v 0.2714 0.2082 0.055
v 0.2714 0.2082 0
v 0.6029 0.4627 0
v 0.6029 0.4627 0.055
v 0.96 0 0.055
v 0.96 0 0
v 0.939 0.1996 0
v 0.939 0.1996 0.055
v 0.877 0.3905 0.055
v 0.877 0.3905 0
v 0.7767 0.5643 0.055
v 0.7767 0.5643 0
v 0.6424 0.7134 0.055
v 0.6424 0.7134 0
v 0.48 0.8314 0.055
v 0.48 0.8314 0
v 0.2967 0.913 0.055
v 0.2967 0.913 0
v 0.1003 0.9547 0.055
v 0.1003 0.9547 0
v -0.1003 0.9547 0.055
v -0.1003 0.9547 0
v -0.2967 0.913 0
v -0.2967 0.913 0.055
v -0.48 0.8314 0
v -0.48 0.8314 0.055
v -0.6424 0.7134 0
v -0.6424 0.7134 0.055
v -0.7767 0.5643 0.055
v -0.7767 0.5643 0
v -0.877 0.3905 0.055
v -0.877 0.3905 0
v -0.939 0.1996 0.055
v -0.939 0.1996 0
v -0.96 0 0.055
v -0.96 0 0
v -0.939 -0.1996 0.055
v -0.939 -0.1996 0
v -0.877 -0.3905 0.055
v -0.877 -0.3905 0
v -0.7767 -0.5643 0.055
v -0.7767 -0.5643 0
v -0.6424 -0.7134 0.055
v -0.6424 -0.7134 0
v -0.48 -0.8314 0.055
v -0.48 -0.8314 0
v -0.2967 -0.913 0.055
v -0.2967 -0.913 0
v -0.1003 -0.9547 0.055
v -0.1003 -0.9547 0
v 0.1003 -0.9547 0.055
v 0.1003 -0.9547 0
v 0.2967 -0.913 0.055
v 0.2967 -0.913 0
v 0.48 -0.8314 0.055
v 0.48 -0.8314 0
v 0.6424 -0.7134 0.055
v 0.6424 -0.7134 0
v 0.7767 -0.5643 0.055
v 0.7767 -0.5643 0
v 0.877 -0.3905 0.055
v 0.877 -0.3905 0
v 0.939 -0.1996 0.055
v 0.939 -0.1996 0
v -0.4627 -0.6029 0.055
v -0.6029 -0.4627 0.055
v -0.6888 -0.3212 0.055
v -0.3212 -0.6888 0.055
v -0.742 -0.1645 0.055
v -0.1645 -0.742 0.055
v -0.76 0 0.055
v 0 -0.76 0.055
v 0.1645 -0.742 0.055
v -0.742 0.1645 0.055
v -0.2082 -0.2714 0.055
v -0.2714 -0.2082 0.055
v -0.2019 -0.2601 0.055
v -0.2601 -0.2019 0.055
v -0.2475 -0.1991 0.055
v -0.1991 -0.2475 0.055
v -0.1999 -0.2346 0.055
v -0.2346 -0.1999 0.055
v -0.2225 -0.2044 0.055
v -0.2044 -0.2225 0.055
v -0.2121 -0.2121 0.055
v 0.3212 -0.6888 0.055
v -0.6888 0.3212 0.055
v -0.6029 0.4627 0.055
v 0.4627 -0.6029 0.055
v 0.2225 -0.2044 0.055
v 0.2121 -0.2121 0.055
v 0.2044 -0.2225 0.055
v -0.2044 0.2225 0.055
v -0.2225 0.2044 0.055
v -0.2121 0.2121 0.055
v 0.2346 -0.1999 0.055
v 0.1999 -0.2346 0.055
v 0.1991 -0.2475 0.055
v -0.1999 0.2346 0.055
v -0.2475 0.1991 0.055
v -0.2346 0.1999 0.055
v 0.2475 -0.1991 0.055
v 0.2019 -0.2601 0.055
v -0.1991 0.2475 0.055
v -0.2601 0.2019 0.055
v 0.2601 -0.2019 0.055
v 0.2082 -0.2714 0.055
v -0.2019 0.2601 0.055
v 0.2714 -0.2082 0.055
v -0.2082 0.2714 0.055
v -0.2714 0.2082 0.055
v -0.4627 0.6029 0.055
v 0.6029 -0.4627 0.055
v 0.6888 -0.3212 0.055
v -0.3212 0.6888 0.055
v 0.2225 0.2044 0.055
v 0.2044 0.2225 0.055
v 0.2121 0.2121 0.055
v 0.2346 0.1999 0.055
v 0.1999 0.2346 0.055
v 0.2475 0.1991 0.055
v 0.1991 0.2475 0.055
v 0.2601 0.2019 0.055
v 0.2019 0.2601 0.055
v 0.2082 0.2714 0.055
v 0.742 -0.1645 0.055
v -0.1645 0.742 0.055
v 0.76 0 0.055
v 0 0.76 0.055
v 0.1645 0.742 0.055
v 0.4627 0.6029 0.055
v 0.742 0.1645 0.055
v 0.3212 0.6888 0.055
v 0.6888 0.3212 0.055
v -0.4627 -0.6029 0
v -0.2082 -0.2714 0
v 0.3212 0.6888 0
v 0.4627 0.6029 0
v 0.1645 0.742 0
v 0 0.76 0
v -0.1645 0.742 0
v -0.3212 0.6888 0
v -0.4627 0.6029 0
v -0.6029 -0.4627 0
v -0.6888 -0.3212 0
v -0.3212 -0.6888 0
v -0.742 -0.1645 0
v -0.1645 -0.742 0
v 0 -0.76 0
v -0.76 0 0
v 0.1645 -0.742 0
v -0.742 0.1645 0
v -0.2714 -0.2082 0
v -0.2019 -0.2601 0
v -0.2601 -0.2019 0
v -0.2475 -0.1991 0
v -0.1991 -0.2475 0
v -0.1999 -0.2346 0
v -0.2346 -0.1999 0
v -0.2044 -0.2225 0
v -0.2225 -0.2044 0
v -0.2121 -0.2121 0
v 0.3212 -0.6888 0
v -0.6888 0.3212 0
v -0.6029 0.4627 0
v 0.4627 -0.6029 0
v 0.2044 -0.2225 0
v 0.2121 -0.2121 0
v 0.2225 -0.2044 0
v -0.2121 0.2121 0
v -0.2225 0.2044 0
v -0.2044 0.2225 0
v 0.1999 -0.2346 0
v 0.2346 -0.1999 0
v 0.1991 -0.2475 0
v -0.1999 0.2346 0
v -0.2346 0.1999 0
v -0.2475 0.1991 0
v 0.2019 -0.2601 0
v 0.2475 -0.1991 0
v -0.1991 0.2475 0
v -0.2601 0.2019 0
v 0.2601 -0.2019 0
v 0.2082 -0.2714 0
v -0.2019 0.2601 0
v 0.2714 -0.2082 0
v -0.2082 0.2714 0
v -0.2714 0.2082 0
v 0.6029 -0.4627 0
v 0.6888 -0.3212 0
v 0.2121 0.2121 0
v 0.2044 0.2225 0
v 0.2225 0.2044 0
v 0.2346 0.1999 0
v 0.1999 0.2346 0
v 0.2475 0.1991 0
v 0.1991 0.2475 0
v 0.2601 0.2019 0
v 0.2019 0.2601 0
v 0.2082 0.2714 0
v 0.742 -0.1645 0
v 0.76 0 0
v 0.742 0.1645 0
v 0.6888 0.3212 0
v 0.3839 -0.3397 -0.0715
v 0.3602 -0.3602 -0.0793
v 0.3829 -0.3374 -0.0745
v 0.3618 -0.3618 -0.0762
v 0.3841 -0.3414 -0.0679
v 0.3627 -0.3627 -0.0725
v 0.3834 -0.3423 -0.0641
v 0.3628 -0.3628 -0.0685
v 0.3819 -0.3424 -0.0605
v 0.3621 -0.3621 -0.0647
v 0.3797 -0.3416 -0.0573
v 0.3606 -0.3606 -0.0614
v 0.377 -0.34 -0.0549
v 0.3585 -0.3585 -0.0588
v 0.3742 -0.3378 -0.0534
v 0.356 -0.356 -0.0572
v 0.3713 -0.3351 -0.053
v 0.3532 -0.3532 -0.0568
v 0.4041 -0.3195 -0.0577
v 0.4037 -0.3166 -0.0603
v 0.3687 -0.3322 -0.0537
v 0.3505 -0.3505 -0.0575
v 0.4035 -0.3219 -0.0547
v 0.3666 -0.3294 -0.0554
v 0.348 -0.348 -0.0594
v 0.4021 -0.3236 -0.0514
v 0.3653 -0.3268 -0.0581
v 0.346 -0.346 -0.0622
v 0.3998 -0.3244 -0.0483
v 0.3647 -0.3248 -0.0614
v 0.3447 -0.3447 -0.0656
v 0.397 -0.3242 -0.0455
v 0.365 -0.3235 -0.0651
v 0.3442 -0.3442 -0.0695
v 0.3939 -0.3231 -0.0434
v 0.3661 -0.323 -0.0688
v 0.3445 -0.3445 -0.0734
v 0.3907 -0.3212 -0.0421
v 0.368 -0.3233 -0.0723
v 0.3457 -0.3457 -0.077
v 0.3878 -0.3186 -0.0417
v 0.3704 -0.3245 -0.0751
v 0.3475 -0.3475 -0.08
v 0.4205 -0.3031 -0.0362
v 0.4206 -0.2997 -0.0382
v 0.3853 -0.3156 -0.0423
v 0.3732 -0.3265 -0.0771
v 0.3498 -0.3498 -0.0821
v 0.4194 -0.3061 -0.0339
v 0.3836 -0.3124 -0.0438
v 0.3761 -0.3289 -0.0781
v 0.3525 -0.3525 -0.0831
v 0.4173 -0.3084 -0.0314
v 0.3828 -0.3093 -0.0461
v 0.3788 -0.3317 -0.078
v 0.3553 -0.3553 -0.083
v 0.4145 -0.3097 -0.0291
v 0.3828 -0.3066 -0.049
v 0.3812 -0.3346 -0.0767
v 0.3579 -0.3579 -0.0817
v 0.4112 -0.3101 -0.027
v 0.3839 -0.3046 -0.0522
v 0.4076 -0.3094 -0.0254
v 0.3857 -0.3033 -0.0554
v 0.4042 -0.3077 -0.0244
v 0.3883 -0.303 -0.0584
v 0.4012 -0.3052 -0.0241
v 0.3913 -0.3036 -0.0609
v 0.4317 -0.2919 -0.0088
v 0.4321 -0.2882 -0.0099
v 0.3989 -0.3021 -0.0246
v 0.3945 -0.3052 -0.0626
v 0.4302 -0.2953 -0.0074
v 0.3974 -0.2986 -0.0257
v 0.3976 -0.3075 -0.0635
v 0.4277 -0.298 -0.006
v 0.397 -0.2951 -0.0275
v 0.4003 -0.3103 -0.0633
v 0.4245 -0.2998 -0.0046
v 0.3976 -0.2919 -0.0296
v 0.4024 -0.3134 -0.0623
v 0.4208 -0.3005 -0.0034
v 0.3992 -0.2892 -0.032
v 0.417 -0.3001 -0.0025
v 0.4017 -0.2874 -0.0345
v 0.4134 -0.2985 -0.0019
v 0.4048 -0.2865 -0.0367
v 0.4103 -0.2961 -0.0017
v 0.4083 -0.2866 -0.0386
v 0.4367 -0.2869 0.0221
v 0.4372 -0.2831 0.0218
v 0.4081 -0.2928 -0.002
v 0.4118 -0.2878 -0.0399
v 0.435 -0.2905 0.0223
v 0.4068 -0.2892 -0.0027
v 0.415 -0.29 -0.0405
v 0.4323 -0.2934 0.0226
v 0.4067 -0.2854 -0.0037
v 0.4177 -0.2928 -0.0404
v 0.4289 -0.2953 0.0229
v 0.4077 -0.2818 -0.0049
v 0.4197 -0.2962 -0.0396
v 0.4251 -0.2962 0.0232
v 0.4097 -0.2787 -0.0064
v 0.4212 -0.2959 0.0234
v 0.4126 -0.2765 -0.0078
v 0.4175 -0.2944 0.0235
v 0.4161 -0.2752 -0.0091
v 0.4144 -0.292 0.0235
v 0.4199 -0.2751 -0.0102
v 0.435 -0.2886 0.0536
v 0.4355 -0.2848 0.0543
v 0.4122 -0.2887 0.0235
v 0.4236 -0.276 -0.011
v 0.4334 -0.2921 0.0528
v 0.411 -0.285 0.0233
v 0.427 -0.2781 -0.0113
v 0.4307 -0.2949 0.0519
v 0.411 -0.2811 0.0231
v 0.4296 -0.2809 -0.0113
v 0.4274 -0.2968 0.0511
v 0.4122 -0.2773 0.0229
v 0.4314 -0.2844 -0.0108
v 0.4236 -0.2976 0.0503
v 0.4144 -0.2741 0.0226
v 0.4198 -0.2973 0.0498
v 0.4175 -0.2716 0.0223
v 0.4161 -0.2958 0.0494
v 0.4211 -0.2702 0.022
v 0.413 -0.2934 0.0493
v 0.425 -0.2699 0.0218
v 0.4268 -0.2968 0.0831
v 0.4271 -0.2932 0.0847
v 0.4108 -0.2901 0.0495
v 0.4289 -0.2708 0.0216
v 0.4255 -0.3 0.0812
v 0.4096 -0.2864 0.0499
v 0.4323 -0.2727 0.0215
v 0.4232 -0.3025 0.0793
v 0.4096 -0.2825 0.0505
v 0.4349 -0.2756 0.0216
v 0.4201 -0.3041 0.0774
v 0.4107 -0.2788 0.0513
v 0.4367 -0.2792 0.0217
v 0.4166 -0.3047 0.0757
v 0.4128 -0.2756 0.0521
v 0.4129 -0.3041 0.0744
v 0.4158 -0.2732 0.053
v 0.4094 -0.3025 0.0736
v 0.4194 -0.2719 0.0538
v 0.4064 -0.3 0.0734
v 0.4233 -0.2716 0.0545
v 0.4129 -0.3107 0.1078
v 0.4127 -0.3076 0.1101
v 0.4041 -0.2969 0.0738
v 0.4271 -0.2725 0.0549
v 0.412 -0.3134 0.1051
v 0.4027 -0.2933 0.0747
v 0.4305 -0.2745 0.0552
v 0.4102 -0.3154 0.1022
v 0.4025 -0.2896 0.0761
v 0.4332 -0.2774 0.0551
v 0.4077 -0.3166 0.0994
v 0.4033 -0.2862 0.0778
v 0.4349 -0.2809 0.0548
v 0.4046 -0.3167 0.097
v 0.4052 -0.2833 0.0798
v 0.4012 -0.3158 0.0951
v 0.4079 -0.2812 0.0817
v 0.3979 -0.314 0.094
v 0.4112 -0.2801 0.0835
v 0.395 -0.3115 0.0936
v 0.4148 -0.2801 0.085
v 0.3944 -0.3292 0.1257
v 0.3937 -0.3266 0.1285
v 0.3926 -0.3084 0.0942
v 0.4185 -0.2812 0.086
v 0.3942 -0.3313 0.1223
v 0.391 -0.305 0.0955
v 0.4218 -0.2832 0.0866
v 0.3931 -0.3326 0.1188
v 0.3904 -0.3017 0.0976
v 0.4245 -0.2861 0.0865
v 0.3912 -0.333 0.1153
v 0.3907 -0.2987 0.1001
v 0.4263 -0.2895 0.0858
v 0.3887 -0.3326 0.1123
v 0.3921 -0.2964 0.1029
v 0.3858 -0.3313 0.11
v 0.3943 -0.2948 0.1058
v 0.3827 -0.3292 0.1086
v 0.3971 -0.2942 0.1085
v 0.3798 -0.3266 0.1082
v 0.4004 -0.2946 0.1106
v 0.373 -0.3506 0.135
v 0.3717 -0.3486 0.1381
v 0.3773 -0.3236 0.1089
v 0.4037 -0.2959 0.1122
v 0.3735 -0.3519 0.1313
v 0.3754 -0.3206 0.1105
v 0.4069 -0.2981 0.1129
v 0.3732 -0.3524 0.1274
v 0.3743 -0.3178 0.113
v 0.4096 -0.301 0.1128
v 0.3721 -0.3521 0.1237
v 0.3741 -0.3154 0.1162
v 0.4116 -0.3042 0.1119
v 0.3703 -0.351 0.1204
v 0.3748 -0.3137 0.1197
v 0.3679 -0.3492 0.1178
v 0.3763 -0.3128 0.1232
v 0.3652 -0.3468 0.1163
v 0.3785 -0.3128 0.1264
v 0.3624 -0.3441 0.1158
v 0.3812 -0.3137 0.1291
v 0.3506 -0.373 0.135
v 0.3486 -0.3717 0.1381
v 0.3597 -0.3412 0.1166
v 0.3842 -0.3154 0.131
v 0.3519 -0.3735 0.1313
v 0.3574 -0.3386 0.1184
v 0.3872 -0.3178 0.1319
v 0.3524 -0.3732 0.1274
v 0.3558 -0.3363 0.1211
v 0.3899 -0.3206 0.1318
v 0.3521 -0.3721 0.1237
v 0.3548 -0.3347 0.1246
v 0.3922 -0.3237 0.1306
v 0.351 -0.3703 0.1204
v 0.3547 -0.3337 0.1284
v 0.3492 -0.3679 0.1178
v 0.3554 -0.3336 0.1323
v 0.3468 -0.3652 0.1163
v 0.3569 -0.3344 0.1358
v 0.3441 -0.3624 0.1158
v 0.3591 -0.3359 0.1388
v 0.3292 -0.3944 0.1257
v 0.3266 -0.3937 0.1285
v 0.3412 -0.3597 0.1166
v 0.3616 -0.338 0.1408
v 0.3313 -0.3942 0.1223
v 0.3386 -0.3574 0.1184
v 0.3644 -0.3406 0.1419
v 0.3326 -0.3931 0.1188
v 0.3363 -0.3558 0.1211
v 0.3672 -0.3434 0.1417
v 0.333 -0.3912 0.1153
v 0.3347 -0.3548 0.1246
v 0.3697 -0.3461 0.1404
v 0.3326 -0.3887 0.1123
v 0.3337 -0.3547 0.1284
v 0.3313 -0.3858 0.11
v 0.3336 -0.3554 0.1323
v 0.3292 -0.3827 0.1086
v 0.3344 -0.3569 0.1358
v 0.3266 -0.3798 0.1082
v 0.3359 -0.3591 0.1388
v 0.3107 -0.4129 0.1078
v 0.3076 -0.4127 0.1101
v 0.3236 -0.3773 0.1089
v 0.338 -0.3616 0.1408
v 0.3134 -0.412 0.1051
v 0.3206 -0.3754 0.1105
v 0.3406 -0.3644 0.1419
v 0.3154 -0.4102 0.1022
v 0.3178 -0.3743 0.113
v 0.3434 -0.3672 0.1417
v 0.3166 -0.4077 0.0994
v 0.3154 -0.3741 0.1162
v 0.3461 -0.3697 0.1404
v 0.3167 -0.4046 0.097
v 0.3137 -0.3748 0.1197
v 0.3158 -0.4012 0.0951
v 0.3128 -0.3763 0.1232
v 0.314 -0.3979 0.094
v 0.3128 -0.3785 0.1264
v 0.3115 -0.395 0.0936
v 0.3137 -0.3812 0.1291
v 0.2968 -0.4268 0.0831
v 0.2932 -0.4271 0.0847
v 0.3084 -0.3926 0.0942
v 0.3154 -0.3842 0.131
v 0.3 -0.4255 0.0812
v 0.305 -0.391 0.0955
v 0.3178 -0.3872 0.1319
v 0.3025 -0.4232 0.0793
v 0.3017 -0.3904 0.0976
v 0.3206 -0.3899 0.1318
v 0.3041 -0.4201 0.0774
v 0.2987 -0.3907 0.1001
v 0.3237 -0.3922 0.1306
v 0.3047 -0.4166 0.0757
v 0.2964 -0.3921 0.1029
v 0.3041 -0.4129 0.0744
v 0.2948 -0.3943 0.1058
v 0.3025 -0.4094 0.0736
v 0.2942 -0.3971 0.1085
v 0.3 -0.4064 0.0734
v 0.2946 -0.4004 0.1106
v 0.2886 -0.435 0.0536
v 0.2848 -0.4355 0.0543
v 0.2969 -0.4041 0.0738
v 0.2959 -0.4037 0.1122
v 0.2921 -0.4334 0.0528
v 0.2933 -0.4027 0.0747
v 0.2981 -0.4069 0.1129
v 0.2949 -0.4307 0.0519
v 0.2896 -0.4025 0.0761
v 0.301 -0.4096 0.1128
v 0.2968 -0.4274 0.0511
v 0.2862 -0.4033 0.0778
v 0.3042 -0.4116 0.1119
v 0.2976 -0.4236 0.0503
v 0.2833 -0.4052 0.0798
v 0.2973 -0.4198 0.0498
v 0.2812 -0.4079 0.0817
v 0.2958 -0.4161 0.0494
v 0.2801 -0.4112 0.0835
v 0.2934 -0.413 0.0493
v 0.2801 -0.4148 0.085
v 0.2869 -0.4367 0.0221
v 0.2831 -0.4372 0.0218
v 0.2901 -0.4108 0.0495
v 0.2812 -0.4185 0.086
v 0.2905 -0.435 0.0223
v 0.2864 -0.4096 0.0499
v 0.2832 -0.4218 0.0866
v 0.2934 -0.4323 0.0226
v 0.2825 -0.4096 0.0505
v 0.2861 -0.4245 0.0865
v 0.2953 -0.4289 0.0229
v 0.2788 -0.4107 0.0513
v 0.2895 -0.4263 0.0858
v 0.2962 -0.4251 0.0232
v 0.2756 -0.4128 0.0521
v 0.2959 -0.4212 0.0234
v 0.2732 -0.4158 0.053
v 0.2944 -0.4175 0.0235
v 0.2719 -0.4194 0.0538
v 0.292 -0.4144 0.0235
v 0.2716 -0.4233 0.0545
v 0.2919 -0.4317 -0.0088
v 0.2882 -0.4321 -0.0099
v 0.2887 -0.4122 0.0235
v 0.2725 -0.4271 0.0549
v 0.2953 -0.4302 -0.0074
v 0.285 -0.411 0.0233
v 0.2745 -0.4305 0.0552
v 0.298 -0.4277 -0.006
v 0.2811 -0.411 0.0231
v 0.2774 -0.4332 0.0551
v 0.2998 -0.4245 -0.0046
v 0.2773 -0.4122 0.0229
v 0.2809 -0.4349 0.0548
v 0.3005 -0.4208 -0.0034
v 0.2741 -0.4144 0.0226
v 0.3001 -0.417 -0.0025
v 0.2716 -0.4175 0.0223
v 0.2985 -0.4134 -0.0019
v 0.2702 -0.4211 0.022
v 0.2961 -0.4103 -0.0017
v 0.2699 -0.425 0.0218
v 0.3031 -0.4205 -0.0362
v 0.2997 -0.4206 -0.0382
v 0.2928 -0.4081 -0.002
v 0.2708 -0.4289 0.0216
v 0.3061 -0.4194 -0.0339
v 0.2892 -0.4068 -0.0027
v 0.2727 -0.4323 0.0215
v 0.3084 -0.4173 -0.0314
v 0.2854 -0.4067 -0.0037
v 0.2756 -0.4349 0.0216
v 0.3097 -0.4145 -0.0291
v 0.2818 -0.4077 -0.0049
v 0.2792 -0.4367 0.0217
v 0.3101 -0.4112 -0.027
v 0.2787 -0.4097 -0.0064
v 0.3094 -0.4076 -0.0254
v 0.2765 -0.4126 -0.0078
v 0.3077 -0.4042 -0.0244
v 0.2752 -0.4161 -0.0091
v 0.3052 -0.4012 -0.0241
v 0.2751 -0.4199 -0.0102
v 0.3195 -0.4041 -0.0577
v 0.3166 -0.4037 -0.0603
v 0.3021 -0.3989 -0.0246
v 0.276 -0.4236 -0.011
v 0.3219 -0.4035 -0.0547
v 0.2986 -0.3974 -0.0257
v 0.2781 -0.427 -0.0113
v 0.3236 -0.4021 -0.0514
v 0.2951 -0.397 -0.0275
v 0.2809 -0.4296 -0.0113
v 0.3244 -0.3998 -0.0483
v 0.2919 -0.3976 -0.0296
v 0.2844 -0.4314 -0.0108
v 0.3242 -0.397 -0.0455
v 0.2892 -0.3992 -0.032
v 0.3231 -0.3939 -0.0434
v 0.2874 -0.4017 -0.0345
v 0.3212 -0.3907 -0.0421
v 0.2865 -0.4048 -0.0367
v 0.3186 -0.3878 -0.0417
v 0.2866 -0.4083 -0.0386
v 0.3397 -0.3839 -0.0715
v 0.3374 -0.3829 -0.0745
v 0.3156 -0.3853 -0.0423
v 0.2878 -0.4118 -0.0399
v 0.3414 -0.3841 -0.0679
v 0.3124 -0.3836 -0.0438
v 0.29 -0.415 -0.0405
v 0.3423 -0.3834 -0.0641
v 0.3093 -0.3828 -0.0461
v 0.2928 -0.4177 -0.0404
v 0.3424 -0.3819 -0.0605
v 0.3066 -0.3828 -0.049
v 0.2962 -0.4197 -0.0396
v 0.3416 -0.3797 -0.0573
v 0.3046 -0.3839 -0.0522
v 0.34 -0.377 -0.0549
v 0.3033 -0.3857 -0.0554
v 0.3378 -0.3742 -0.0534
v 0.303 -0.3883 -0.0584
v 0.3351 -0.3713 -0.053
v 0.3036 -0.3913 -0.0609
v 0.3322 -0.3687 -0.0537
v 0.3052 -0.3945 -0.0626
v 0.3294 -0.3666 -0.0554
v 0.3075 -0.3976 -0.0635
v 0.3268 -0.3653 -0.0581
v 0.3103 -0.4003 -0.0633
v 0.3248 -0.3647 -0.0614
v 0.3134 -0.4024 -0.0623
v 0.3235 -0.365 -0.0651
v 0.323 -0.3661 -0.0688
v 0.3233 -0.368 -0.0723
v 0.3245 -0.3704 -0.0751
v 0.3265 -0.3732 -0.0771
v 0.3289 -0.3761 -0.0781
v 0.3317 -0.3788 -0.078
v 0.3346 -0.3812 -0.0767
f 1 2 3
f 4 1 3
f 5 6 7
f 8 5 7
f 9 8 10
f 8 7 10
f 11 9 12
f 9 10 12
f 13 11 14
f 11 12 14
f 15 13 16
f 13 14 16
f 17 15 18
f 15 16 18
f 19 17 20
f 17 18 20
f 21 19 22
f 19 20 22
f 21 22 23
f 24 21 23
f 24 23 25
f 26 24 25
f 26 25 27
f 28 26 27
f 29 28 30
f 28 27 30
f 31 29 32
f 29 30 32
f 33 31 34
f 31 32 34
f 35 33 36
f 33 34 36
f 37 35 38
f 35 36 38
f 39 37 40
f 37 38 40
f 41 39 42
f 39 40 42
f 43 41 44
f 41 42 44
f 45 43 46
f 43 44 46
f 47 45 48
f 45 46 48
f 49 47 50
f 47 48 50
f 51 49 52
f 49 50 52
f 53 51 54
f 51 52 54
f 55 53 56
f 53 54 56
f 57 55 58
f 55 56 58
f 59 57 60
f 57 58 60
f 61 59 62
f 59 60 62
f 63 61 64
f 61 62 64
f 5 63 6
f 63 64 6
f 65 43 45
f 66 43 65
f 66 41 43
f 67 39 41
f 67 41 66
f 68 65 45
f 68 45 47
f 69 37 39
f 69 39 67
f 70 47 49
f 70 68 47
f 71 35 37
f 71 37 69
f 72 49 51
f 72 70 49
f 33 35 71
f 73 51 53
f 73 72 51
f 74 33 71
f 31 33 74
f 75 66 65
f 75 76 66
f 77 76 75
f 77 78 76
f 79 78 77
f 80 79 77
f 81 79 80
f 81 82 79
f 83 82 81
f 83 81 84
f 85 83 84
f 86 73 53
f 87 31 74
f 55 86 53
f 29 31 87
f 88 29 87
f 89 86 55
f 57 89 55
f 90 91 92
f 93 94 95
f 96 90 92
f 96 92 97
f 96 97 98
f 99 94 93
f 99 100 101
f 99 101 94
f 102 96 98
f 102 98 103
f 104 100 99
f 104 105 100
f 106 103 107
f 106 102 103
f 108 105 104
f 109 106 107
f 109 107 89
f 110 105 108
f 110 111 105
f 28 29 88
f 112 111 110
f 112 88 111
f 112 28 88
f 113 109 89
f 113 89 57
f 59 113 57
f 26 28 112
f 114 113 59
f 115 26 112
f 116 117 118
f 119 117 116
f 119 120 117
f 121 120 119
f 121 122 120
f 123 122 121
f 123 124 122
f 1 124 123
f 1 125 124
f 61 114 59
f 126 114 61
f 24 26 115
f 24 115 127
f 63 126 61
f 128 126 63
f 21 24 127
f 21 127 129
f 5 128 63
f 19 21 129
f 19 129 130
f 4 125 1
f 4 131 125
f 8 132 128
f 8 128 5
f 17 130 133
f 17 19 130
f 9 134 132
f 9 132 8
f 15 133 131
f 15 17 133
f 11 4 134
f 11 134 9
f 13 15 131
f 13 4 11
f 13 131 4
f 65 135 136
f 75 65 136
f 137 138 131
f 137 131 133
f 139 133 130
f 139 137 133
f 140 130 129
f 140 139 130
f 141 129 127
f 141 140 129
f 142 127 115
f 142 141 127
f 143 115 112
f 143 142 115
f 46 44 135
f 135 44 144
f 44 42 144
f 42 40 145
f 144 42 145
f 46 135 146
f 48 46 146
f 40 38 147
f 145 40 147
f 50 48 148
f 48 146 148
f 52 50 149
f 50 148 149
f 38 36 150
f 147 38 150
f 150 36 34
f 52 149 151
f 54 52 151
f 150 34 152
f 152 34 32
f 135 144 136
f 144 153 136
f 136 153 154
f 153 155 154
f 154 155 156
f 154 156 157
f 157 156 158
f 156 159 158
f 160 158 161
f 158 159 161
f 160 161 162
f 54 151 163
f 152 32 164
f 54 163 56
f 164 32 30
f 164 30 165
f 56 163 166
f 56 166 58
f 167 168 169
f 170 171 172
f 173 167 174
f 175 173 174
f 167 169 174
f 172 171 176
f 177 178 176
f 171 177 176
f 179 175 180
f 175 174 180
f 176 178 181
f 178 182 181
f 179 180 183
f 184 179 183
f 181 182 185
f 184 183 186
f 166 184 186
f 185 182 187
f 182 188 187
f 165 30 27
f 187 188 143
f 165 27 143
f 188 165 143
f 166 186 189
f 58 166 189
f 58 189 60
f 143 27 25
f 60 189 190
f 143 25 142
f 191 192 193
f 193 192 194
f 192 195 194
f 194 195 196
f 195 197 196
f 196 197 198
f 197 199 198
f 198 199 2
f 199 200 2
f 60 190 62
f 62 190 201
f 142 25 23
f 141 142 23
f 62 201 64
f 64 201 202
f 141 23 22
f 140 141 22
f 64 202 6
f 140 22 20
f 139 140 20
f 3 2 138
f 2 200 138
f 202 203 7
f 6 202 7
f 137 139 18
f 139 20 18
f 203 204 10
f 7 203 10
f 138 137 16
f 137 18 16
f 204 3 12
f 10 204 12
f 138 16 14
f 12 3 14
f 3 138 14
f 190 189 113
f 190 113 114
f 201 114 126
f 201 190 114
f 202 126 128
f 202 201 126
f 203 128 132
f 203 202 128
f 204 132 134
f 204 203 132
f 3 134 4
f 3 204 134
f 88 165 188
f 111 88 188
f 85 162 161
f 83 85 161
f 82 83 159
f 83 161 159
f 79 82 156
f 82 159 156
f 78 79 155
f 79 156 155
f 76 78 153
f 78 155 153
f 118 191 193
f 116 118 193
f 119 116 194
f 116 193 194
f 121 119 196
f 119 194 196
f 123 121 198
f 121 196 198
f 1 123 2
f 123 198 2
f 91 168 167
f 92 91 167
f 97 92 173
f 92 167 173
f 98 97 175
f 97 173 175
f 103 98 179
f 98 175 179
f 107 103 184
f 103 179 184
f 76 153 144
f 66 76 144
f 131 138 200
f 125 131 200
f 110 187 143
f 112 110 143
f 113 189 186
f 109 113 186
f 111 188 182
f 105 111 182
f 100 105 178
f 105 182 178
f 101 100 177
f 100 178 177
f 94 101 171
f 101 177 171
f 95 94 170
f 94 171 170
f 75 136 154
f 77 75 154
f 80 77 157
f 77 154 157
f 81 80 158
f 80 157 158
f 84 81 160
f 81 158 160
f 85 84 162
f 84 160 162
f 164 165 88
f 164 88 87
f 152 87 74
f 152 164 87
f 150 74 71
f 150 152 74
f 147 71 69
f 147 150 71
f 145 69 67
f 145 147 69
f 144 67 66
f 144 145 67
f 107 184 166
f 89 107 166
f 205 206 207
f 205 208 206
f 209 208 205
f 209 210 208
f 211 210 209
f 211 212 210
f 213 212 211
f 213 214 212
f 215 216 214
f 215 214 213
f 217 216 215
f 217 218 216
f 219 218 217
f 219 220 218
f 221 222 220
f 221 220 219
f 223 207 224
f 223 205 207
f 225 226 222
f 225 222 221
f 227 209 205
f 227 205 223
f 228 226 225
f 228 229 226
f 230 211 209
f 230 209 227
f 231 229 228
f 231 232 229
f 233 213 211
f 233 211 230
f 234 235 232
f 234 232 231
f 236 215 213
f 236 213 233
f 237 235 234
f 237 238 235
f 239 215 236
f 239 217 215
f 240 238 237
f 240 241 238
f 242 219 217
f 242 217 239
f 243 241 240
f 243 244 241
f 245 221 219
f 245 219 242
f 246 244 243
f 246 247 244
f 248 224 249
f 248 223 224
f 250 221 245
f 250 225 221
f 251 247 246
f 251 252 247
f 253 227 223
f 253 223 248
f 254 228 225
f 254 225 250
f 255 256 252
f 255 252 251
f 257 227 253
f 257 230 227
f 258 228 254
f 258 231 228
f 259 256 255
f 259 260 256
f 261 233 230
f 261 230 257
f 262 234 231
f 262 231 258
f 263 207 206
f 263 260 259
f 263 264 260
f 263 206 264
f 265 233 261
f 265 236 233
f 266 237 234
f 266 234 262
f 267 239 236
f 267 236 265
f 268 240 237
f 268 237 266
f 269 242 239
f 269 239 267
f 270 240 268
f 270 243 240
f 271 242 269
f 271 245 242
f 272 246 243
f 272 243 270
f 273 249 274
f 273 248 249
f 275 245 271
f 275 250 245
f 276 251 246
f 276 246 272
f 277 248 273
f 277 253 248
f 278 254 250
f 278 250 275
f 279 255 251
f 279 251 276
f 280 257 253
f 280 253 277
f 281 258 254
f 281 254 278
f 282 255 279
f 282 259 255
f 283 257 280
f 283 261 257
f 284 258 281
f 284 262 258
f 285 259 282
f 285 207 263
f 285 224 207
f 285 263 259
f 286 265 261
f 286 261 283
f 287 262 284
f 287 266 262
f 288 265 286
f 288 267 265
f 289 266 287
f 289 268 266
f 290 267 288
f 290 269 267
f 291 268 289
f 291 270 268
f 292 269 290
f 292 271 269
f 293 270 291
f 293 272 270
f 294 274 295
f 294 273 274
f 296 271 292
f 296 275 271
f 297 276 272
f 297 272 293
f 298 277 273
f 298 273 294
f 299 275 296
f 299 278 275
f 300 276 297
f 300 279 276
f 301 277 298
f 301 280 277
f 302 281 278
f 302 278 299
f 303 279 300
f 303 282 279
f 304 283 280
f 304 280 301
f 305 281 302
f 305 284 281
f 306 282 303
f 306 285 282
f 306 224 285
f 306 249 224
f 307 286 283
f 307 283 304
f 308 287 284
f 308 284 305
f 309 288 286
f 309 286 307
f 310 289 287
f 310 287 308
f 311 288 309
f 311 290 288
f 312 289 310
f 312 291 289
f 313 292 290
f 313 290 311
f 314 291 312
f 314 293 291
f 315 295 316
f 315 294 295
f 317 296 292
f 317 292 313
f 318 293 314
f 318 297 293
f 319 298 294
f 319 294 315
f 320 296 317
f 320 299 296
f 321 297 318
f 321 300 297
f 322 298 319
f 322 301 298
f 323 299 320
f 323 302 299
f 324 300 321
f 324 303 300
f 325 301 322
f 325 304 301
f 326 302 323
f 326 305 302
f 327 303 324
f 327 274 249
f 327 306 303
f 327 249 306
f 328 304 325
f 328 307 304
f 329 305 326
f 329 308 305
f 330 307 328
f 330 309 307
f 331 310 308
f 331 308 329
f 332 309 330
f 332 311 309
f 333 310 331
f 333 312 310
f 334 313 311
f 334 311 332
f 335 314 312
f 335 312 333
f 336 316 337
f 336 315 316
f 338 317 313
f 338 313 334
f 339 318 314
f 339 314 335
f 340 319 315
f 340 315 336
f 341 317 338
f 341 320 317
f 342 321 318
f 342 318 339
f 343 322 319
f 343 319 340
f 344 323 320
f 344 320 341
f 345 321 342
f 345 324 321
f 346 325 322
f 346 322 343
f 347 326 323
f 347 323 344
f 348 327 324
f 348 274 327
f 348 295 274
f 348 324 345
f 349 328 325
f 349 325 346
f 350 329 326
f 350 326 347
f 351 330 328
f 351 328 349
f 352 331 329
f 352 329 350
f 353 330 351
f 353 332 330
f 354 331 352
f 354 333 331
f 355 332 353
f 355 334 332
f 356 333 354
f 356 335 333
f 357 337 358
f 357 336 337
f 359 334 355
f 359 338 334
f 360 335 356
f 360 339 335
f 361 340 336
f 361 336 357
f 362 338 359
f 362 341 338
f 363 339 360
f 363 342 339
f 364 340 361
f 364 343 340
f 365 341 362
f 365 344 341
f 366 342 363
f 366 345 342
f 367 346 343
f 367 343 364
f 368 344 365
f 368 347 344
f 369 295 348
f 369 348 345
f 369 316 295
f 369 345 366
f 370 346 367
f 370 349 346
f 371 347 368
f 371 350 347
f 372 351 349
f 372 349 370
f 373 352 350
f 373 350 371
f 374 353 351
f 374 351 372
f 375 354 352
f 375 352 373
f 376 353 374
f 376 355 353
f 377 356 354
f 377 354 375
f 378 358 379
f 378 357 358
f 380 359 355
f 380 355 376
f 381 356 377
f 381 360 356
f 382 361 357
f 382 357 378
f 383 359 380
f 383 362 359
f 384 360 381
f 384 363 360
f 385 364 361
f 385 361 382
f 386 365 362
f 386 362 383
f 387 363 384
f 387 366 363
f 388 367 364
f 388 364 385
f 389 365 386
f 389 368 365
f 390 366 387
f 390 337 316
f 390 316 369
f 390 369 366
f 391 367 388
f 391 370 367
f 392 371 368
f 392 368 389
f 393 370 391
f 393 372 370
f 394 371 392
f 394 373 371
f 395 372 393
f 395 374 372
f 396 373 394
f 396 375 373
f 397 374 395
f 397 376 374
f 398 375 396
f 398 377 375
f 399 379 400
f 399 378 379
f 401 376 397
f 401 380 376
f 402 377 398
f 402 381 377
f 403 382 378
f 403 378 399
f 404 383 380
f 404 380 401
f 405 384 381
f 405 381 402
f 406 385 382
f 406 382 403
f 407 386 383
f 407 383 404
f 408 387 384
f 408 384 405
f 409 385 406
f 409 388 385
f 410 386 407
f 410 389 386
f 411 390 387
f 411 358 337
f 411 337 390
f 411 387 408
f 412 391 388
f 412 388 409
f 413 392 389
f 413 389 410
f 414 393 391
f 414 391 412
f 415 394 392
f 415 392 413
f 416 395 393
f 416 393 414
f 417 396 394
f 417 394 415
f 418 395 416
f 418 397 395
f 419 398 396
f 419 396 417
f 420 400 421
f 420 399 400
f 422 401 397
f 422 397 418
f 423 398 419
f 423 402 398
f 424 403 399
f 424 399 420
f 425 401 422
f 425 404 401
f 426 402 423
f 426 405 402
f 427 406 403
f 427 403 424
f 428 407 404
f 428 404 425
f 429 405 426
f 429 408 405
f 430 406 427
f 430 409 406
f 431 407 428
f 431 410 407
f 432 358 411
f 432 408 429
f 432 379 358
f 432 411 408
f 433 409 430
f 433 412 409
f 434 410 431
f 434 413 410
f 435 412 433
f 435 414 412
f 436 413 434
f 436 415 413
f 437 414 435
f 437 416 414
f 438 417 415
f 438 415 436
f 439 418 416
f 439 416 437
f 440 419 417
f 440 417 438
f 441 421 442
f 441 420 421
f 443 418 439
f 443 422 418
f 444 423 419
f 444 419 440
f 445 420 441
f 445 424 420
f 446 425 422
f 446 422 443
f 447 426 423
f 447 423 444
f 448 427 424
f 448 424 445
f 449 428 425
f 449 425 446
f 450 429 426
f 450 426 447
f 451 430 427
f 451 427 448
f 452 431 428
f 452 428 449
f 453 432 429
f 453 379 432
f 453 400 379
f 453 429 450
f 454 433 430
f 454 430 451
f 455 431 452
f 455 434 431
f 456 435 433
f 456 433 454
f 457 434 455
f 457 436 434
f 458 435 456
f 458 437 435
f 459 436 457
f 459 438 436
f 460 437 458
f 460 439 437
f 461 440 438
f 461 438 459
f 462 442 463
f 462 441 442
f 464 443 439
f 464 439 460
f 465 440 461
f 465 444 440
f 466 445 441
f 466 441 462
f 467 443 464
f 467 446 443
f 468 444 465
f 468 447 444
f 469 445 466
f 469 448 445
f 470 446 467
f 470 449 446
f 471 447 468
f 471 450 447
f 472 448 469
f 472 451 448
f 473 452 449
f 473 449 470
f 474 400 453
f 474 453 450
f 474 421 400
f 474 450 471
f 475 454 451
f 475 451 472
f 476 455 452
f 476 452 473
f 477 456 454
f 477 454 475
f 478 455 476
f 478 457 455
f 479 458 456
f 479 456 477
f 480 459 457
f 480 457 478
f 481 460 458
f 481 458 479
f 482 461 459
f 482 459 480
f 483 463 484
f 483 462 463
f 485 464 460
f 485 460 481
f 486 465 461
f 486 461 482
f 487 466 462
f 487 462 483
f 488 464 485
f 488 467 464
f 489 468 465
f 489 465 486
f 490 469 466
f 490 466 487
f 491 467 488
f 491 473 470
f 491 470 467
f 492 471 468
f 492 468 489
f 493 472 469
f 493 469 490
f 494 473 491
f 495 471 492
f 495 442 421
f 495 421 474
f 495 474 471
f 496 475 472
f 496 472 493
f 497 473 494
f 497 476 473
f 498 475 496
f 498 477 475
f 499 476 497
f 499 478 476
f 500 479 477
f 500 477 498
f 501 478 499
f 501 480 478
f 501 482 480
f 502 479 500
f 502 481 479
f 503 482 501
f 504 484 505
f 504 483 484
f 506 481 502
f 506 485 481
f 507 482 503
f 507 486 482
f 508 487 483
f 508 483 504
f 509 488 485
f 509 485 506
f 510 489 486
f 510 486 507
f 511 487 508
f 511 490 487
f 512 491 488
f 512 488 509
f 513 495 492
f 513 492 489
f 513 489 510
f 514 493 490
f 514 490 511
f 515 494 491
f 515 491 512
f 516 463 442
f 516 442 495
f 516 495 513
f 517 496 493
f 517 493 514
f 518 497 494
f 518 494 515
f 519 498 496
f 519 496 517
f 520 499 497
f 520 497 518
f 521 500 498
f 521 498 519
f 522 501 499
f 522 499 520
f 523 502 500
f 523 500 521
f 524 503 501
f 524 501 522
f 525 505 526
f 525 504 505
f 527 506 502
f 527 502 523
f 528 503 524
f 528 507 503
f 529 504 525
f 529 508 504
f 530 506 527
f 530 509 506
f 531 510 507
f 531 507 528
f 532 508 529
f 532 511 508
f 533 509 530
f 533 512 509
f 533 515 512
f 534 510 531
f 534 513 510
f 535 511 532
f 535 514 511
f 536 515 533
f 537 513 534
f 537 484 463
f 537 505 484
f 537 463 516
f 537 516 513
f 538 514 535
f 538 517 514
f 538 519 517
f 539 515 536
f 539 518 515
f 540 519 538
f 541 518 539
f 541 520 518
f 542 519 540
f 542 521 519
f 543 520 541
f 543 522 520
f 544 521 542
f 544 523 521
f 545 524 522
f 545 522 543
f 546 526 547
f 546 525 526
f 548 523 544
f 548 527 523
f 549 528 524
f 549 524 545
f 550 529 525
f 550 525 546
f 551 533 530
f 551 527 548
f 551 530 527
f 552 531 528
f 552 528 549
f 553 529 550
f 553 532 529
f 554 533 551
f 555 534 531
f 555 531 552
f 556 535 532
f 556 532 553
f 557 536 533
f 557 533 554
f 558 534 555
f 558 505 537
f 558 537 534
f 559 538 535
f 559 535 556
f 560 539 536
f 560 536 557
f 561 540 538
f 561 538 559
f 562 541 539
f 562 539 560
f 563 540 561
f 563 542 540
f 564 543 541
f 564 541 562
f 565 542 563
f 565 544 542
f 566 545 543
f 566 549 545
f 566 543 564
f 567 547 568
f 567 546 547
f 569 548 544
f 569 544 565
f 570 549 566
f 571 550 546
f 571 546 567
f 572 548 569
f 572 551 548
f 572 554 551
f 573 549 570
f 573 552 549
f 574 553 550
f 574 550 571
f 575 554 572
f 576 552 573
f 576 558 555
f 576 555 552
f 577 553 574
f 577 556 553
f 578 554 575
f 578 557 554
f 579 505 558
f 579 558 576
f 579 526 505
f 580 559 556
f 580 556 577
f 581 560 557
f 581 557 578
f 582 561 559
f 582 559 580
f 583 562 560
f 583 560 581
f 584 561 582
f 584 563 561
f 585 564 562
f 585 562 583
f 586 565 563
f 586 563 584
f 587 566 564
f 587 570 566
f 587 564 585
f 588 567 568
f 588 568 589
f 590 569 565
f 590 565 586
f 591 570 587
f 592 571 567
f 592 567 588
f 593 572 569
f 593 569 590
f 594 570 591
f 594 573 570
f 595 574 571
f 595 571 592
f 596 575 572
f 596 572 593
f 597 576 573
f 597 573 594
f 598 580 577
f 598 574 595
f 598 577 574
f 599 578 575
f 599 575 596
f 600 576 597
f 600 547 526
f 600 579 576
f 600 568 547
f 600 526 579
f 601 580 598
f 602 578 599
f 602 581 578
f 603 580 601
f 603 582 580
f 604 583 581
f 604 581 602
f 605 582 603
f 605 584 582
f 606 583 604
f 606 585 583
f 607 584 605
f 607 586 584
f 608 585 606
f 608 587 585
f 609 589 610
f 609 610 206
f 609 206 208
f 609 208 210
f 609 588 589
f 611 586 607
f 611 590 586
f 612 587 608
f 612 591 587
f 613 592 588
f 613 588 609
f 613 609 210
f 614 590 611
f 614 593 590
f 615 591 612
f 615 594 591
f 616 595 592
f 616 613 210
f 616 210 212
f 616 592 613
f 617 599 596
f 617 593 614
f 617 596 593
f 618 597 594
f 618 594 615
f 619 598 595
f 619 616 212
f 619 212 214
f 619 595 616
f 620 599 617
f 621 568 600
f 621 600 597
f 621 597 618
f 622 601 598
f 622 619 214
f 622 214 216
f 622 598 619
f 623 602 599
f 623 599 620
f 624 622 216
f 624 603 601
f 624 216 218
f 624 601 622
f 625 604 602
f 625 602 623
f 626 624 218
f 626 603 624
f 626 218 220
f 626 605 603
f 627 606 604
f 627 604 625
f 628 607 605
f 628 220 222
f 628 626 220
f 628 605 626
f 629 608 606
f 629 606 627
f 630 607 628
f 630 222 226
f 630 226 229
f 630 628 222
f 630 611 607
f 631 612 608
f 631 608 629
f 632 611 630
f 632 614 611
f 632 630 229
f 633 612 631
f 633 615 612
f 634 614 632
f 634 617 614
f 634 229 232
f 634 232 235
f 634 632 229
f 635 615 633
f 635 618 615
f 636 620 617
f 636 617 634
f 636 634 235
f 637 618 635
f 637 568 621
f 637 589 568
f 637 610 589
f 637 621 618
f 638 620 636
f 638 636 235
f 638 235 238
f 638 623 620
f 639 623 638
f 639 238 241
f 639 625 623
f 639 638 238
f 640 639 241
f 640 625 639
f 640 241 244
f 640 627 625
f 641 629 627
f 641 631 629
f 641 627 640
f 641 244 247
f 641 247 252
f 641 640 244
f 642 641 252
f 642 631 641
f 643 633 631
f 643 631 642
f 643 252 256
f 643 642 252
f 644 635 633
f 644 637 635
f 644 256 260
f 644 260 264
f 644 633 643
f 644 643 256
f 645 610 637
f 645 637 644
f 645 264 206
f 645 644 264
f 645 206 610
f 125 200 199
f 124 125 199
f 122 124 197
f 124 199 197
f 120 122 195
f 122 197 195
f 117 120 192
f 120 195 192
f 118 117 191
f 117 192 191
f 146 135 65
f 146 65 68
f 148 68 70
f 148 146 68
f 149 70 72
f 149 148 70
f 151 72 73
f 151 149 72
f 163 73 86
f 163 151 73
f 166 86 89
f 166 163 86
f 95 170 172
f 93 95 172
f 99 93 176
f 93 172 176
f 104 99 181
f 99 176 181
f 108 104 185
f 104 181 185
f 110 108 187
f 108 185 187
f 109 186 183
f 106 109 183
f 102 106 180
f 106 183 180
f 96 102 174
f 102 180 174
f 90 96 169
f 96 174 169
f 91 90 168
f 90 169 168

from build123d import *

# Parameters (mm, degrees)
SKETCH_1_R      = 0.96
SKETCH_1_R_2    = 0.76
EXTRUDE_1_DEPTH = 0.055
EXTRUDE_START   = -0.055
EXTRUDE_2_DEPTH = 0.055
SKETCH_73_R     = 0.0132


with BuildPart() as part:
    # 草圖1 → 填料-伸長1 (new body)
    with BuildSketch(Plane.XY):
        Circle(SKETCH_1_R)
        Circle(SKETCH_1_R_2, mode=Mode.SUBTRACT)
    extrude(amount=EXTRUDE_1_DEPTH)

    # 草圖2 → 填料-伸長2 (add)
    with BuildSketch(Plane.XY.offset(0.055).offset(EXTRUDE_START)):
        with BuildLine():
            Line((-0.208247811, 0.271393831), (-0.462658686, 0.602948539))
            ThreePointArc((-0.462658686, 0.602948539), (-0.537401154, 0.537401154), (-0.602948539, 0.462658686))
            Line((-0.602948539, 0.462658686), (-0.271393831, 0.208247811))
            ThreePointArc((-0.271393831, 0.208247811), (-0.241031974, 0.199037642), (-0.212132034, 0.212132034))
            ThreePointArc((-0.212132034, 0.212132034), (-0.199037642, 0.241031974), (-0.208247811, 0.271393831))
        make_face()
        with BuildLine():
            ThreePointArc((0.208247811, 0.271393831), (0.199037642, 0.241031974), (0.212132034, 0.212132034))
            ThreePointArc((0.212132034, 0.212132034), (0.241031974, 0.199037642), (0.271393831, 0.208247811))
            Line((0.271393831, 0.208247811), (0.602948539, 0.462658686))
            ThreePointArc((0.602948539, 0.462658686), (0.537401154, 0.537401154), (0.462658686, 0.602948539))
            Line((0.462658686, 0.602948539), (0.208247811, 0.271393831))
        make_face()
        with BuildLine():
            ThreePointArc((0.271393831, -0.208247811), (0.241031974, -0.199037642), (0.212132034, -0.212132034))
            ThreePointArc((0.212132034, -0.212132034), (0.199037642, -0.241031974), (0.208247811, -0.271393831))
            Line((0.208247811, -0.271393831), (0.462658686, -0.602948539))
            ThreePointArc((0.462658686, -0.602948539), (0.537401154, -0.537401154), (0.602948539, -0.462658686))
            Line((0.602948539, -0.462658686), (0.271393831, -0.208247811))
        make_face()
        with BuildLine():
            ThreePointArc((-0.208247811, -0.271393831), (-0.199037642, -0.241031974), (-0.212132034, -0.212132034))
            ThreePointArc((-0.212132034, -0.212132034), (-0.241031974, -0.199037642), (-0.271393831, -0.208247811))
            Line((-0.271393831, -0.208247811), (-0.602948539, -0.462658686))
            ThreePointArc((-0.602948539, -0.462658686), (-0.537401154, -0.537401154), (-0.462658686, -0.602948539))
            Line((-0.462658686, -0.602948539), (-0.208247811, -0.271393831))
        make_face()
    extrude(amount=EXTRUDE_2_DEPTH)


with BuildPart() as body_2:
    # 掃出2: sweep along a path in 草圖72
    with BuildLine(Plane(origin=(0.353553391, -0.353553391, 0), x_dir=(0, 0, -1), z_dir=(0.7071067811865487, -0.7071067811865464, 0))) as sweep_2_path:
        CenterArc((-0.03, 0), 0.1, 0, 360)
    # 草圖73 → 掃出2 (sweep)
    with BuildSketch(Plane(origin=(0.424264069, -0.282842712, 0.03), x_dir=(1, 0, 0), z_dir=(0, 0, 1))):
        Circle(SKETCH_73_R)
    sweep(path=sweep_2_path.line)


solid = Compound([part.part, body_2.part])
